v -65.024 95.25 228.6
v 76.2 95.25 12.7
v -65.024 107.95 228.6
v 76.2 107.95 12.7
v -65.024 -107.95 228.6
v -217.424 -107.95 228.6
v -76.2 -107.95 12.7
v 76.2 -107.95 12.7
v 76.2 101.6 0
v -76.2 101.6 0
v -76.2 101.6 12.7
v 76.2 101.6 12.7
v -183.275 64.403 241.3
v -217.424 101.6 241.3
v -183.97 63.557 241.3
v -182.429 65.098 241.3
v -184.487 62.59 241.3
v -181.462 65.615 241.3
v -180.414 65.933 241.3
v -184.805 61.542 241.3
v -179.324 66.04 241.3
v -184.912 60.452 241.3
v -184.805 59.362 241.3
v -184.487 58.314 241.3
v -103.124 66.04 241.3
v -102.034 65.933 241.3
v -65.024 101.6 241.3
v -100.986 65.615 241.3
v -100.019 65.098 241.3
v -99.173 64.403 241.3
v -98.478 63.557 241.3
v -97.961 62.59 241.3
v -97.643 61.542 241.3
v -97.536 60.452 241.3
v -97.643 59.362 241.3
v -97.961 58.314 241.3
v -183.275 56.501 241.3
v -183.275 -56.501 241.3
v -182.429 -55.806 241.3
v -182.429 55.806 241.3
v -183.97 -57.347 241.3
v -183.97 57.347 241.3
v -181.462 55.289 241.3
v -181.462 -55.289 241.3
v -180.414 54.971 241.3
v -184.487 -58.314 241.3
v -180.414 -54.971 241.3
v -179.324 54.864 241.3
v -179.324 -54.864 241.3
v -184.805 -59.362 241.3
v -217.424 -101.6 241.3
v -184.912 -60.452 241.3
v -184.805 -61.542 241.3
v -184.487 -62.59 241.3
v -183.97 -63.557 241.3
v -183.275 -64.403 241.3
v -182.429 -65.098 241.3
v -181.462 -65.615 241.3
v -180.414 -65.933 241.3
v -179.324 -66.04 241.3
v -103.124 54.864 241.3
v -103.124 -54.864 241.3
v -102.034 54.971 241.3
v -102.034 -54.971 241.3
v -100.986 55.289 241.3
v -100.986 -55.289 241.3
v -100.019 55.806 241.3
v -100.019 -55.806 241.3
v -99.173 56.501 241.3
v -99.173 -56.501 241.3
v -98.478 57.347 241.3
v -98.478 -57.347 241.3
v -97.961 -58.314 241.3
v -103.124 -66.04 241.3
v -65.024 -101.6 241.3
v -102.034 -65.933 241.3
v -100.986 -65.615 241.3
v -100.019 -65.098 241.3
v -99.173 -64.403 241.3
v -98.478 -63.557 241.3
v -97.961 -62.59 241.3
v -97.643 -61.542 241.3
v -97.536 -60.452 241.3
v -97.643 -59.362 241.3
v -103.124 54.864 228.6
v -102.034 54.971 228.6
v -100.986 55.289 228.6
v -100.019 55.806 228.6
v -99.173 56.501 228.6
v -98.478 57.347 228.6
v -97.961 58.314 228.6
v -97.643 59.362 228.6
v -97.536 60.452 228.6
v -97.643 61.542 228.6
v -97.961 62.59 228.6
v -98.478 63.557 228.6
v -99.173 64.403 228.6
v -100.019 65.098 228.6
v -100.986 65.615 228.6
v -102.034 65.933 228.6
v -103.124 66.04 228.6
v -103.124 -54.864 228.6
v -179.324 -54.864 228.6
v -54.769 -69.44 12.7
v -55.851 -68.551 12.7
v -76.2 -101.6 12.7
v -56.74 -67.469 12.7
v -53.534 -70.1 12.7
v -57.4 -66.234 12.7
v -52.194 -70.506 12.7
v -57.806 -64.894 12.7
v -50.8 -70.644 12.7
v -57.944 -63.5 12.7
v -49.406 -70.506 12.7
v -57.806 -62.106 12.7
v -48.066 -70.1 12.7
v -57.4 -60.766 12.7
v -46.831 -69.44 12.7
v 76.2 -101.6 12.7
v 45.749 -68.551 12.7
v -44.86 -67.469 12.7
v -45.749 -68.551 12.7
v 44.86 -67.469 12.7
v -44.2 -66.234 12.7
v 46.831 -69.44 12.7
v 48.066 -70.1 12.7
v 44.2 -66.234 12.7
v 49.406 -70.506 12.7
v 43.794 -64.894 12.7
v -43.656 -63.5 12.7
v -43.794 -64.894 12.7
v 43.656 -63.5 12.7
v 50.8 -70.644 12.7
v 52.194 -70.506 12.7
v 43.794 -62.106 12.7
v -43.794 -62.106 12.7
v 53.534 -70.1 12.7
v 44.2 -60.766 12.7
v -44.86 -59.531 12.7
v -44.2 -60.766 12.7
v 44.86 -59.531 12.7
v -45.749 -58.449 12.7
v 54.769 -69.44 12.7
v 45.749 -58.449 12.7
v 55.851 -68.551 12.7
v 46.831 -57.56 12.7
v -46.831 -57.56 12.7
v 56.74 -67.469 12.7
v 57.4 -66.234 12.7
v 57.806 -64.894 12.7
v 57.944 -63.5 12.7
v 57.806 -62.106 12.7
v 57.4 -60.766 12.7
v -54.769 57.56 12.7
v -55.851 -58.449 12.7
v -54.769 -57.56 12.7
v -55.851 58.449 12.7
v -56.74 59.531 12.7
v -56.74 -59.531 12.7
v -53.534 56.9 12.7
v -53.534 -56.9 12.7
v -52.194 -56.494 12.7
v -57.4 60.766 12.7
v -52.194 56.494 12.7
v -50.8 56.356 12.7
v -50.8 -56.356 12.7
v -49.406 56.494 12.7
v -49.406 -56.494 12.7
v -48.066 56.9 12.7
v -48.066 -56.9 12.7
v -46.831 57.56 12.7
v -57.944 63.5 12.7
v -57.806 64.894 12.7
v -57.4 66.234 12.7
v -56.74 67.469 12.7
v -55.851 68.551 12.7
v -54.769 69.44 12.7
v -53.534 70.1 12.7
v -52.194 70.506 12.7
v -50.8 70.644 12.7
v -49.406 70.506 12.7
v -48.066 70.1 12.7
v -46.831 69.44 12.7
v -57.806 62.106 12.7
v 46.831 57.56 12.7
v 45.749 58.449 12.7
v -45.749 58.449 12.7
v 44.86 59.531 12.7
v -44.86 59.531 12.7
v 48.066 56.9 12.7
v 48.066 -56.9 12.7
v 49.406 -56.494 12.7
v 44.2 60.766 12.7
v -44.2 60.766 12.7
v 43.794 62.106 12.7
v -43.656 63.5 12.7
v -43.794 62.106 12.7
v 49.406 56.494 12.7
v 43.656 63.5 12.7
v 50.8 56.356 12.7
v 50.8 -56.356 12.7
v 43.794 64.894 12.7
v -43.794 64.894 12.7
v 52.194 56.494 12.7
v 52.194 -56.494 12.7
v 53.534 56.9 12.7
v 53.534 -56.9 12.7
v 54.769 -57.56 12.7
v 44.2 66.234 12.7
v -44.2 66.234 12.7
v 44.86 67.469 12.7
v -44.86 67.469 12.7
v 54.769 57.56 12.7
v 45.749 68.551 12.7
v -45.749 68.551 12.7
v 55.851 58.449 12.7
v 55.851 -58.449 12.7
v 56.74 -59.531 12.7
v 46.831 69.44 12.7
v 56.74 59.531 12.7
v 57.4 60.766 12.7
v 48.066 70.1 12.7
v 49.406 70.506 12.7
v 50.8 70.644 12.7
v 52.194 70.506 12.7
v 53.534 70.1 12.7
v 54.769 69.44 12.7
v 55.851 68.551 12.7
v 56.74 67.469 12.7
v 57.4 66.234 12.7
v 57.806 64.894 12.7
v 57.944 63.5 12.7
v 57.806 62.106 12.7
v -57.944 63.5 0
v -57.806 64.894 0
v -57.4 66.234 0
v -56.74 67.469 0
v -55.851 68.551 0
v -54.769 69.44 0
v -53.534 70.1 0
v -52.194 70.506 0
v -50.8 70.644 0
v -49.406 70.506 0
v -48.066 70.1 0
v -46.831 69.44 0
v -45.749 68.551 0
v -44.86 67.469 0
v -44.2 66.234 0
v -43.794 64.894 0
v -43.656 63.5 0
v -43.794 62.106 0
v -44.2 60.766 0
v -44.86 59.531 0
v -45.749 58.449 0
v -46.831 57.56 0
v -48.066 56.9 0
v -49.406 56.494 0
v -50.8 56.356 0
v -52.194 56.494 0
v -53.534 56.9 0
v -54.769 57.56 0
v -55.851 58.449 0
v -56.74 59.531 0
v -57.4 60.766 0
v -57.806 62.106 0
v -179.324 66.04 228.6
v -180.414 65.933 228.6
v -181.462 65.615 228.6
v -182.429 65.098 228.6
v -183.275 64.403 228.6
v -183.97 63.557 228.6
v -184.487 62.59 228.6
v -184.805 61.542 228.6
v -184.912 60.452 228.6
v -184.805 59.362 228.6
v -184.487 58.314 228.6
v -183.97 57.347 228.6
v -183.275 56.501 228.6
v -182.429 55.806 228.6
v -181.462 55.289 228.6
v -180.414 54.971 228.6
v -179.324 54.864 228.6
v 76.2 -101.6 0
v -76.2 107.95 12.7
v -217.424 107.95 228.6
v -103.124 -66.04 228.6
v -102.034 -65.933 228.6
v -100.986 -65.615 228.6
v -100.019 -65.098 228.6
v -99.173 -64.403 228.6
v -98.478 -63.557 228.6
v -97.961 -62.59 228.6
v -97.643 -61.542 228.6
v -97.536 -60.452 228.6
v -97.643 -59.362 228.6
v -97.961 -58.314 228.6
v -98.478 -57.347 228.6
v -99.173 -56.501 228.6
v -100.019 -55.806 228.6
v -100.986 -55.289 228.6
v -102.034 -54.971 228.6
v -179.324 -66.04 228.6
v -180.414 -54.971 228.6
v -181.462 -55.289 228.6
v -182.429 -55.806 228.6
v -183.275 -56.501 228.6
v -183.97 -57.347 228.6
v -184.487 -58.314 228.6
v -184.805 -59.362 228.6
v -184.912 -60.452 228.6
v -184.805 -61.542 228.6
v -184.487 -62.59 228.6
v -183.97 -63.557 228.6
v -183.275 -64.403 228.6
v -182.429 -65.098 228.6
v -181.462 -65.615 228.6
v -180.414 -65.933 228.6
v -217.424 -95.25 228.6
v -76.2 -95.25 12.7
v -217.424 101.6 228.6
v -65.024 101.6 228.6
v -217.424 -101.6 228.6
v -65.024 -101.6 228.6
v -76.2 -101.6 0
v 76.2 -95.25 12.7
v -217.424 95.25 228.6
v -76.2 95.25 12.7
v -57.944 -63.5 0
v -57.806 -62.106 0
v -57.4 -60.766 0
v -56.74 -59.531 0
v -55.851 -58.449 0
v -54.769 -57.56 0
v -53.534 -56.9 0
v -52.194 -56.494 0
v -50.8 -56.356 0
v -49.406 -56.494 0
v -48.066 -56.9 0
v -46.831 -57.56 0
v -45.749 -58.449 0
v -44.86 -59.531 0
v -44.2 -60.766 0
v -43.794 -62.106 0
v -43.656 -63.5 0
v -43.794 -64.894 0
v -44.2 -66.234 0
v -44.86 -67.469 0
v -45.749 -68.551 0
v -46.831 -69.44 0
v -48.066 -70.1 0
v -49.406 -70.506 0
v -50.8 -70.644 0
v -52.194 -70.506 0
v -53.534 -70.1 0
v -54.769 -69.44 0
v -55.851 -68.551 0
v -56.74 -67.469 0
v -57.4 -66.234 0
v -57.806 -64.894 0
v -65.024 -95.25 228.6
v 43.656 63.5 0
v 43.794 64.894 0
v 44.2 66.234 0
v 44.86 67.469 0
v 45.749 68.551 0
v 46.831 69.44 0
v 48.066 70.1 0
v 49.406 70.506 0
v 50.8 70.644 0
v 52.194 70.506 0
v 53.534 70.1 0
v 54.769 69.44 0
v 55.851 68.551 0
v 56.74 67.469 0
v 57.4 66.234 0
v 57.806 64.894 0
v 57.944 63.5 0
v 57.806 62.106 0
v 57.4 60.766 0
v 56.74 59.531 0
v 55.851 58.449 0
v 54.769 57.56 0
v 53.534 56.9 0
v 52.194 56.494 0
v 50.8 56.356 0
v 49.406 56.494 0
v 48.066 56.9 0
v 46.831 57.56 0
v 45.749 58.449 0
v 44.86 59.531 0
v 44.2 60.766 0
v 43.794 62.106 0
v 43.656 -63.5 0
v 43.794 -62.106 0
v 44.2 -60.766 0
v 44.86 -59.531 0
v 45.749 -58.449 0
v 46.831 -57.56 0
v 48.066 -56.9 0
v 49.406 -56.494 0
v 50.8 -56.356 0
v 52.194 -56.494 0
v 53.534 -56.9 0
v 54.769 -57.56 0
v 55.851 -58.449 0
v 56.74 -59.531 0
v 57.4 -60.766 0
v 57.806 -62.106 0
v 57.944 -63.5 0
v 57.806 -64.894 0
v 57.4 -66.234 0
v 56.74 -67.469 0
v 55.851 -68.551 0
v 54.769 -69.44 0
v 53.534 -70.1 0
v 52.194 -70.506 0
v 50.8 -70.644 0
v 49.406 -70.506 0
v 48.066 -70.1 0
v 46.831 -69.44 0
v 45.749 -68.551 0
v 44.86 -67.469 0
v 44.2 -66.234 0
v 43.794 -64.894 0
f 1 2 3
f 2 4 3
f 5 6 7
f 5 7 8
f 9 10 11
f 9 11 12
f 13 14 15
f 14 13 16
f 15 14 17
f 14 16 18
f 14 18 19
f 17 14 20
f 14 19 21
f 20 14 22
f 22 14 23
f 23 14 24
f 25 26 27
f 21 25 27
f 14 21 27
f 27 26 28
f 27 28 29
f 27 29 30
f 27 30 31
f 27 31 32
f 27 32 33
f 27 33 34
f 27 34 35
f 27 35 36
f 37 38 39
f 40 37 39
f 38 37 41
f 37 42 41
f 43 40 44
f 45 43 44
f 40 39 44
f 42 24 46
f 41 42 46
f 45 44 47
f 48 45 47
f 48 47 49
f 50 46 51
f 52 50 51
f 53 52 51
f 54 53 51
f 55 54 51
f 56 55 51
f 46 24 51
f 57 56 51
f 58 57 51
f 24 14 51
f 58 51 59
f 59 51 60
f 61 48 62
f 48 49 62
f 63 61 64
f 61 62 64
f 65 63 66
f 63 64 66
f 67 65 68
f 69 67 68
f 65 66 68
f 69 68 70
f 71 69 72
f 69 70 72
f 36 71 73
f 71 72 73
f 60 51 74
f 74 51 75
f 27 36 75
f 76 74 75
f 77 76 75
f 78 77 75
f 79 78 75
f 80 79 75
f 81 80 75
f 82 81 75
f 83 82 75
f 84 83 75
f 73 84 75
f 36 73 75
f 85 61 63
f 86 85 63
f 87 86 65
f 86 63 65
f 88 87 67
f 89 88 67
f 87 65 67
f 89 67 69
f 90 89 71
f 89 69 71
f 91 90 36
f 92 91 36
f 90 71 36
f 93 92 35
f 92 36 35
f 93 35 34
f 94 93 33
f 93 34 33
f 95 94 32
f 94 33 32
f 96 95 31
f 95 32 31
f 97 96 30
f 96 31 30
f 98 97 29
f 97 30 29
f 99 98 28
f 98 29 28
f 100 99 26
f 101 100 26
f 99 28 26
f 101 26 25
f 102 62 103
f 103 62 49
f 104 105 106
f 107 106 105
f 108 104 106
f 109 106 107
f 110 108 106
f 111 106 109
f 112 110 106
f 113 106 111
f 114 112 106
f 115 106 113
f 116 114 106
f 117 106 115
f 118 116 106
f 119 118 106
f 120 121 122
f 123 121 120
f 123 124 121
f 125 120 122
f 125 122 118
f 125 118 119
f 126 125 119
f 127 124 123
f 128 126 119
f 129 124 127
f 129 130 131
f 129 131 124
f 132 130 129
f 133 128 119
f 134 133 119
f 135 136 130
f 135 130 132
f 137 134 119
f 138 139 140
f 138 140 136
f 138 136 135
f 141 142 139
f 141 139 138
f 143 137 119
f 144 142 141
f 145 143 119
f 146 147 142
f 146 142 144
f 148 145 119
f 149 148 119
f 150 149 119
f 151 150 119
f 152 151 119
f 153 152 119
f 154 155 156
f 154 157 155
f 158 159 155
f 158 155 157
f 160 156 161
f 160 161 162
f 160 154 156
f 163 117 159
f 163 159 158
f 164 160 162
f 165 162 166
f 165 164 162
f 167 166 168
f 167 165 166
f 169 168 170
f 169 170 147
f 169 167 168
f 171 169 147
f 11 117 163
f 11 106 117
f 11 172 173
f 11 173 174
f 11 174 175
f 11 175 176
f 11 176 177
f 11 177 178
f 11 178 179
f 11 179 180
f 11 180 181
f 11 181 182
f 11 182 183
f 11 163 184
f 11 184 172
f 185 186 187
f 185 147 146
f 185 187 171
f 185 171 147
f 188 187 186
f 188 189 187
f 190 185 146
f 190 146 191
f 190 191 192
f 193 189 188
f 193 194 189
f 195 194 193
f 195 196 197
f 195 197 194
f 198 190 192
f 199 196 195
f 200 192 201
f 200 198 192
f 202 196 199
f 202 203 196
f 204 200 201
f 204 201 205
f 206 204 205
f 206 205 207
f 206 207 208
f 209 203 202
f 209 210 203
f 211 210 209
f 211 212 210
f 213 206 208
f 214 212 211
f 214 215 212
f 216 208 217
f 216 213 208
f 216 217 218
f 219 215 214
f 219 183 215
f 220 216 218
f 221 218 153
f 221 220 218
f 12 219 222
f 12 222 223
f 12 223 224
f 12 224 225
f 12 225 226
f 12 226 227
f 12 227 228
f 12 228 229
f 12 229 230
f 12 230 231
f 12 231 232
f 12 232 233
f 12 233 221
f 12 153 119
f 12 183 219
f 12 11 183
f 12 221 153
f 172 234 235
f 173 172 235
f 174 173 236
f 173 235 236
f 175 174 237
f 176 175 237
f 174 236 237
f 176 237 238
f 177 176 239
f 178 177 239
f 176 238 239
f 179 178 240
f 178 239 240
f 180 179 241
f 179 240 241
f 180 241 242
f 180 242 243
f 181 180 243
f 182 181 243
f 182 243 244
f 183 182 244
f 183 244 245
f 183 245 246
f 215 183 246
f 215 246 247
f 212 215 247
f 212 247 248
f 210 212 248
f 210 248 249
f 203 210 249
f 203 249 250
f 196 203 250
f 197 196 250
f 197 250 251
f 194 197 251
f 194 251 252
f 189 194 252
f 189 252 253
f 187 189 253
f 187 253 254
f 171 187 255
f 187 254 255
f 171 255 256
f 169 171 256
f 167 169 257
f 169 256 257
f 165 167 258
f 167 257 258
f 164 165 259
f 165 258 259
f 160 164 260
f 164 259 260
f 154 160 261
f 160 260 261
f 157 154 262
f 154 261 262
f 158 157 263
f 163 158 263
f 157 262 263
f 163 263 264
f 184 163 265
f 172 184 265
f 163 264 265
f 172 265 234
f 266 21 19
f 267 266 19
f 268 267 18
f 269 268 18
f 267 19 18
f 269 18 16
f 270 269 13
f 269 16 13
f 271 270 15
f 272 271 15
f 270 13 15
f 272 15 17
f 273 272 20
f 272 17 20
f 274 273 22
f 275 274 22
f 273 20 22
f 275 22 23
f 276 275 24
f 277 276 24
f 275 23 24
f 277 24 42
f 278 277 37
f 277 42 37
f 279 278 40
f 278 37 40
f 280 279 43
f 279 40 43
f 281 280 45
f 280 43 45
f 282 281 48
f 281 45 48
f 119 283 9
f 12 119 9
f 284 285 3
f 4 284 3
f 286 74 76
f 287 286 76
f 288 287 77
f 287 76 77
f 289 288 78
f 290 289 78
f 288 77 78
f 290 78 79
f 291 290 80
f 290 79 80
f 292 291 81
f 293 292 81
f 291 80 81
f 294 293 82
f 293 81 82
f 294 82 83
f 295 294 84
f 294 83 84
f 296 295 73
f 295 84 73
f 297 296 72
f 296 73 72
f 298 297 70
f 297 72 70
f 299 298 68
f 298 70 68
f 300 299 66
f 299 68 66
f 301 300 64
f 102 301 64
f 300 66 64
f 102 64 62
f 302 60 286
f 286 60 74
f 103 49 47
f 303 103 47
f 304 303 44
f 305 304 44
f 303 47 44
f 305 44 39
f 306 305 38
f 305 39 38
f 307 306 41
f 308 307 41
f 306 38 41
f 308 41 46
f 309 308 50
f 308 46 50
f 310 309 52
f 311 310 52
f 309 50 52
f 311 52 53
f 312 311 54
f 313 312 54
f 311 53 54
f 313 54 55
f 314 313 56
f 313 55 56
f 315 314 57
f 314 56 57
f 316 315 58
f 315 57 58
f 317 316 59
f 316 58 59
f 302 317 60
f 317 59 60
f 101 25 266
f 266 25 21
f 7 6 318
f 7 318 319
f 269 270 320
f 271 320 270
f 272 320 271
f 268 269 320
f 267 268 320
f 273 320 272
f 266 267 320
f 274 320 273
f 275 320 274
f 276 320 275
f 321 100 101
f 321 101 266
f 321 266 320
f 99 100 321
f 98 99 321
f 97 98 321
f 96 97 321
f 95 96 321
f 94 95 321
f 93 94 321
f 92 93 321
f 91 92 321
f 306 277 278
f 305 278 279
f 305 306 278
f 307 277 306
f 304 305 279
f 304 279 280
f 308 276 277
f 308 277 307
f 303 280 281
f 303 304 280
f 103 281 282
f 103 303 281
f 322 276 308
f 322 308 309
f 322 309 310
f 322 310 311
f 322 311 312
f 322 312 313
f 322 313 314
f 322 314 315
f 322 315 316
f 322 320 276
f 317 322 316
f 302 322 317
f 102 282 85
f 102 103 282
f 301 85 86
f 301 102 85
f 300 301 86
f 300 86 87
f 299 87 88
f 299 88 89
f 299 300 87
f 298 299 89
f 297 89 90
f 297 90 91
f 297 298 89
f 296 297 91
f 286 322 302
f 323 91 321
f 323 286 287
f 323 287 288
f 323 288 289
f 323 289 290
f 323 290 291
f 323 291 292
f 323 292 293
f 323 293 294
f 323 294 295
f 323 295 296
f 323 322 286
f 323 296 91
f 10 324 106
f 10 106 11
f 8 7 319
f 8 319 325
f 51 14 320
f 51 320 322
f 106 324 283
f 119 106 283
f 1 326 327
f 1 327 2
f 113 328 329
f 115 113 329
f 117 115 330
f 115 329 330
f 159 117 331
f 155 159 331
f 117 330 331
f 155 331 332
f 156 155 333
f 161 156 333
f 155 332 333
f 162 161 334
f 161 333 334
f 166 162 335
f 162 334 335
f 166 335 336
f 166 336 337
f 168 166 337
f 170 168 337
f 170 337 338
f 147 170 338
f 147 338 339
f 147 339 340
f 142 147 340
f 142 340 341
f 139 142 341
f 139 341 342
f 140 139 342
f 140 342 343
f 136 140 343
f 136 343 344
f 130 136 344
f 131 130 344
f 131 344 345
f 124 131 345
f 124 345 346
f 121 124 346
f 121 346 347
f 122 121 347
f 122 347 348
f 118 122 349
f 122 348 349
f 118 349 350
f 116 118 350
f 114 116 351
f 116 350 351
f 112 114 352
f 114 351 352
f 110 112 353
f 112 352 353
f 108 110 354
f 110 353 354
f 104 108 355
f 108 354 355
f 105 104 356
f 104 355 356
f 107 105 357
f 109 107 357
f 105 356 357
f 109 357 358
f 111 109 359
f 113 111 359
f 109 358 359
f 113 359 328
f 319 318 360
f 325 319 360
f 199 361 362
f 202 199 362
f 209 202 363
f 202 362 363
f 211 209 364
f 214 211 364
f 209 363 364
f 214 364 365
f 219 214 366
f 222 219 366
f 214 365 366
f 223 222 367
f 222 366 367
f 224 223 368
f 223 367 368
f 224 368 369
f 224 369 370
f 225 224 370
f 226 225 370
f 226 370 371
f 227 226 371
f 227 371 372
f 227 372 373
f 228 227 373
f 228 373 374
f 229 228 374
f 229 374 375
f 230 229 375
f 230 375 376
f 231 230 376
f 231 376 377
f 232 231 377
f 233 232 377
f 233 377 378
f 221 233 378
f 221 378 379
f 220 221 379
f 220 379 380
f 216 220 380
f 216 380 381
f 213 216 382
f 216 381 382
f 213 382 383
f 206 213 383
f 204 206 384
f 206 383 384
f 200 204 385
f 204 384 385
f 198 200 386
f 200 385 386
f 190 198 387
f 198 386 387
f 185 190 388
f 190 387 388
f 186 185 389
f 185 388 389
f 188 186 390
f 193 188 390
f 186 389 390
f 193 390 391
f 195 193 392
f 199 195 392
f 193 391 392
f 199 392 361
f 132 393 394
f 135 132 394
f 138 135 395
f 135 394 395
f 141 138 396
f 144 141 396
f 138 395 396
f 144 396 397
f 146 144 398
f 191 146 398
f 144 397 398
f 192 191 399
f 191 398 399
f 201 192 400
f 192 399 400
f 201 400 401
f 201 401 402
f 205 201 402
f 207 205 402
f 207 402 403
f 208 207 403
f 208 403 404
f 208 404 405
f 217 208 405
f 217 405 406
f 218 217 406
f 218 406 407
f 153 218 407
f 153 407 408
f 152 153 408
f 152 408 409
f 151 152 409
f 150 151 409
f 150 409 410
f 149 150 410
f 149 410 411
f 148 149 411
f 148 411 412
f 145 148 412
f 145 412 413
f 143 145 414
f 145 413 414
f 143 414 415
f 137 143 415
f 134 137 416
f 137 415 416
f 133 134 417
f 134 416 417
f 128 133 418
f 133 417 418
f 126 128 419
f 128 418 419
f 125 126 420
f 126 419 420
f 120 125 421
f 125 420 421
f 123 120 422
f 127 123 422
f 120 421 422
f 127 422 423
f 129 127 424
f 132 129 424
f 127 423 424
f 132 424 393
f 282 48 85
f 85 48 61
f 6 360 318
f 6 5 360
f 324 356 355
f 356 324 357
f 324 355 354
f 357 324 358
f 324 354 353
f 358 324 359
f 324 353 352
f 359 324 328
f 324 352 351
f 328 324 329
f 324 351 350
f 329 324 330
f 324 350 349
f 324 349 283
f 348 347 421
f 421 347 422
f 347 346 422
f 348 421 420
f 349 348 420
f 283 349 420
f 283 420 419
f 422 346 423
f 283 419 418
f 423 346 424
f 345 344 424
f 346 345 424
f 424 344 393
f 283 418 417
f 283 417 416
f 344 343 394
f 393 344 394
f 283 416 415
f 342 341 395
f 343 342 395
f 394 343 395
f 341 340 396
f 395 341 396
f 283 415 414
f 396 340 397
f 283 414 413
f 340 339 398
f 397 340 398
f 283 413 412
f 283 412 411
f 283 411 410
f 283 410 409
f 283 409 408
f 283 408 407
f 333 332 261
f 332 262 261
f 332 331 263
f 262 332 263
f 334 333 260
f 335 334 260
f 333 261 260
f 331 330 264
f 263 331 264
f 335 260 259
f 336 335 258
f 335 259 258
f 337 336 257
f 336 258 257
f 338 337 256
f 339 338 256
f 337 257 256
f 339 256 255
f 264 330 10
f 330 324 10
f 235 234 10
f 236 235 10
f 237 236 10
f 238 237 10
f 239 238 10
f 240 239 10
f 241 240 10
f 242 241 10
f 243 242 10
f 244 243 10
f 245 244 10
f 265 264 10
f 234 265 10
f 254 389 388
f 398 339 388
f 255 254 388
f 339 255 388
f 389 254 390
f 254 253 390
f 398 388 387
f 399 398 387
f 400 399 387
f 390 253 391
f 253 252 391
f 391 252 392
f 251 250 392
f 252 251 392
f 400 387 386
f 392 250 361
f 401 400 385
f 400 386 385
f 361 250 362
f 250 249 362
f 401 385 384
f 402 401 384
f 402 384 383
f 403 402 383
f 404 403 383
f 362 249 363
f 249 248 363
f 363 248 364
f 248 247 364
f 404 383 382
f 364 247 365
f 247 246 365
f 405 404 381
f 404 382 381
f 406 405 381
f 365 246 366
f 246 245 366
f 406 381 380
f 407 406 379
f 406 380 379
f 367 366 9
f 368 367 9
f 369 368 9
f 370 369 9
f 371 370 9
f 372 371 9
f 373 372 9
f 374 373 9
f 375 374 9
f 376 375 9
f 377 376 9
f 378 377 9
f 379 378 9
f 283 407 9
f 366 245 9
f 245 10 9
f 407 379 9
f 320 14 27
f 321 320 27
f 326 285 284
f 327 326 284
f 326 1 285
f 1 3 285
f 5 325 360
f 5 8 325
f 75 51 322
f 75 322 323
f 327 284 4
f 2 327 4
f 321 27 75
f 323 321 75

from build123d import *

# Parameters (mm, degrees)
F0_W      = 152.4
F0_H      = 203.2
F1_DEPTH  = 12.7
F3_D      = 14.2875
F5_W      = 152.4
F5_H      = 203.2
F6_DEPTH  = 12.7
F8_DEPTH  = 241.301
F10_DEPTH = 6.35


# Not quite as in the source:
# - a length typed as a fraction of an inch, garbled in the dataset ("3 / 203.2 mm" for 3/8 in), is restored


with BuildPart() as f1:
    # F0 (on Top) → F1 (new body)
    with BuildSketch(Plane.XY):
        Rectangle(F0_W, F0_H)
    extrude(amount=F1_DEPTH)

    # F3 (through all)
    with Locations(Plane.XY.offset(12.7)):
        with Locations((-50.8, 63.5), (50.8, 63.5), (-50.8, -63.5), (50.8, -63.5)):
            Hole(F3_D / 2)


with BuildPart() as f6:
    # F5 (on offset) → F6 (new body)
    with BuildSketch(Plane(origin=(0, 0, 241.3), x_dir=(1, 0, 0), z_dir=(0, 0, -1))):
        with Locations((-141.224, 0)):
            Rectangle(F5_W, F5_H)
    extrude(amount=F6_DEPTH)

    # F7 (on face) → F8 (cut, through all)
    with BuildSketch(Plane.XY.offset(241.3)):
        with BuildLine():
            ThreePointArc((-179.324, -54.864), (-184.912, -60.452), (-179.324, -66.04))
            Line((-179.324, -66.04), (-103.124, -66.04))
            ThreePointArc((-103.124, -66.04), (-97.536, -60.452), (-103.124, -54.864))
            Line((-103.124, -54.864), (-179.324, -54.864))
        make_face()
        with BuildLine():
            Line((-179.324, 54.864), (-103.124, 54.864))
            ThreePointArc((-103.124, 54.864), (-97.536, 60.452), (-103.124, 66.04))
            Line((-103.124, 66.04), (-179.324, 66.04))
            ThreePointArc((-179.324, 66.04), (-184.912, 60.452), (-179.324, 54.864))
        make_face()
    extrude(amount=-F8_DEPTH, mode=Mode.SUBTRACT)


with BuildPart() as f10:
    # F9 (on face) → F10 (new body, symmetric)
    with BuildSketch(Plane.XZ.offset(101.6)):
        Polygon((-65.024, 228.6), (-217.424, 228.6), (-76.2, 12.7), (76.2, 12.7), align=None)
    extrude(amount=F10_DEPTH, both=True)


with BuildPart() as f11_1:
    # F11: instance of F10
    add(f10.part.mirror(Plane.XZ))


solid = Compound([f1.part, f6.part, f10.part, f11_1.part])
